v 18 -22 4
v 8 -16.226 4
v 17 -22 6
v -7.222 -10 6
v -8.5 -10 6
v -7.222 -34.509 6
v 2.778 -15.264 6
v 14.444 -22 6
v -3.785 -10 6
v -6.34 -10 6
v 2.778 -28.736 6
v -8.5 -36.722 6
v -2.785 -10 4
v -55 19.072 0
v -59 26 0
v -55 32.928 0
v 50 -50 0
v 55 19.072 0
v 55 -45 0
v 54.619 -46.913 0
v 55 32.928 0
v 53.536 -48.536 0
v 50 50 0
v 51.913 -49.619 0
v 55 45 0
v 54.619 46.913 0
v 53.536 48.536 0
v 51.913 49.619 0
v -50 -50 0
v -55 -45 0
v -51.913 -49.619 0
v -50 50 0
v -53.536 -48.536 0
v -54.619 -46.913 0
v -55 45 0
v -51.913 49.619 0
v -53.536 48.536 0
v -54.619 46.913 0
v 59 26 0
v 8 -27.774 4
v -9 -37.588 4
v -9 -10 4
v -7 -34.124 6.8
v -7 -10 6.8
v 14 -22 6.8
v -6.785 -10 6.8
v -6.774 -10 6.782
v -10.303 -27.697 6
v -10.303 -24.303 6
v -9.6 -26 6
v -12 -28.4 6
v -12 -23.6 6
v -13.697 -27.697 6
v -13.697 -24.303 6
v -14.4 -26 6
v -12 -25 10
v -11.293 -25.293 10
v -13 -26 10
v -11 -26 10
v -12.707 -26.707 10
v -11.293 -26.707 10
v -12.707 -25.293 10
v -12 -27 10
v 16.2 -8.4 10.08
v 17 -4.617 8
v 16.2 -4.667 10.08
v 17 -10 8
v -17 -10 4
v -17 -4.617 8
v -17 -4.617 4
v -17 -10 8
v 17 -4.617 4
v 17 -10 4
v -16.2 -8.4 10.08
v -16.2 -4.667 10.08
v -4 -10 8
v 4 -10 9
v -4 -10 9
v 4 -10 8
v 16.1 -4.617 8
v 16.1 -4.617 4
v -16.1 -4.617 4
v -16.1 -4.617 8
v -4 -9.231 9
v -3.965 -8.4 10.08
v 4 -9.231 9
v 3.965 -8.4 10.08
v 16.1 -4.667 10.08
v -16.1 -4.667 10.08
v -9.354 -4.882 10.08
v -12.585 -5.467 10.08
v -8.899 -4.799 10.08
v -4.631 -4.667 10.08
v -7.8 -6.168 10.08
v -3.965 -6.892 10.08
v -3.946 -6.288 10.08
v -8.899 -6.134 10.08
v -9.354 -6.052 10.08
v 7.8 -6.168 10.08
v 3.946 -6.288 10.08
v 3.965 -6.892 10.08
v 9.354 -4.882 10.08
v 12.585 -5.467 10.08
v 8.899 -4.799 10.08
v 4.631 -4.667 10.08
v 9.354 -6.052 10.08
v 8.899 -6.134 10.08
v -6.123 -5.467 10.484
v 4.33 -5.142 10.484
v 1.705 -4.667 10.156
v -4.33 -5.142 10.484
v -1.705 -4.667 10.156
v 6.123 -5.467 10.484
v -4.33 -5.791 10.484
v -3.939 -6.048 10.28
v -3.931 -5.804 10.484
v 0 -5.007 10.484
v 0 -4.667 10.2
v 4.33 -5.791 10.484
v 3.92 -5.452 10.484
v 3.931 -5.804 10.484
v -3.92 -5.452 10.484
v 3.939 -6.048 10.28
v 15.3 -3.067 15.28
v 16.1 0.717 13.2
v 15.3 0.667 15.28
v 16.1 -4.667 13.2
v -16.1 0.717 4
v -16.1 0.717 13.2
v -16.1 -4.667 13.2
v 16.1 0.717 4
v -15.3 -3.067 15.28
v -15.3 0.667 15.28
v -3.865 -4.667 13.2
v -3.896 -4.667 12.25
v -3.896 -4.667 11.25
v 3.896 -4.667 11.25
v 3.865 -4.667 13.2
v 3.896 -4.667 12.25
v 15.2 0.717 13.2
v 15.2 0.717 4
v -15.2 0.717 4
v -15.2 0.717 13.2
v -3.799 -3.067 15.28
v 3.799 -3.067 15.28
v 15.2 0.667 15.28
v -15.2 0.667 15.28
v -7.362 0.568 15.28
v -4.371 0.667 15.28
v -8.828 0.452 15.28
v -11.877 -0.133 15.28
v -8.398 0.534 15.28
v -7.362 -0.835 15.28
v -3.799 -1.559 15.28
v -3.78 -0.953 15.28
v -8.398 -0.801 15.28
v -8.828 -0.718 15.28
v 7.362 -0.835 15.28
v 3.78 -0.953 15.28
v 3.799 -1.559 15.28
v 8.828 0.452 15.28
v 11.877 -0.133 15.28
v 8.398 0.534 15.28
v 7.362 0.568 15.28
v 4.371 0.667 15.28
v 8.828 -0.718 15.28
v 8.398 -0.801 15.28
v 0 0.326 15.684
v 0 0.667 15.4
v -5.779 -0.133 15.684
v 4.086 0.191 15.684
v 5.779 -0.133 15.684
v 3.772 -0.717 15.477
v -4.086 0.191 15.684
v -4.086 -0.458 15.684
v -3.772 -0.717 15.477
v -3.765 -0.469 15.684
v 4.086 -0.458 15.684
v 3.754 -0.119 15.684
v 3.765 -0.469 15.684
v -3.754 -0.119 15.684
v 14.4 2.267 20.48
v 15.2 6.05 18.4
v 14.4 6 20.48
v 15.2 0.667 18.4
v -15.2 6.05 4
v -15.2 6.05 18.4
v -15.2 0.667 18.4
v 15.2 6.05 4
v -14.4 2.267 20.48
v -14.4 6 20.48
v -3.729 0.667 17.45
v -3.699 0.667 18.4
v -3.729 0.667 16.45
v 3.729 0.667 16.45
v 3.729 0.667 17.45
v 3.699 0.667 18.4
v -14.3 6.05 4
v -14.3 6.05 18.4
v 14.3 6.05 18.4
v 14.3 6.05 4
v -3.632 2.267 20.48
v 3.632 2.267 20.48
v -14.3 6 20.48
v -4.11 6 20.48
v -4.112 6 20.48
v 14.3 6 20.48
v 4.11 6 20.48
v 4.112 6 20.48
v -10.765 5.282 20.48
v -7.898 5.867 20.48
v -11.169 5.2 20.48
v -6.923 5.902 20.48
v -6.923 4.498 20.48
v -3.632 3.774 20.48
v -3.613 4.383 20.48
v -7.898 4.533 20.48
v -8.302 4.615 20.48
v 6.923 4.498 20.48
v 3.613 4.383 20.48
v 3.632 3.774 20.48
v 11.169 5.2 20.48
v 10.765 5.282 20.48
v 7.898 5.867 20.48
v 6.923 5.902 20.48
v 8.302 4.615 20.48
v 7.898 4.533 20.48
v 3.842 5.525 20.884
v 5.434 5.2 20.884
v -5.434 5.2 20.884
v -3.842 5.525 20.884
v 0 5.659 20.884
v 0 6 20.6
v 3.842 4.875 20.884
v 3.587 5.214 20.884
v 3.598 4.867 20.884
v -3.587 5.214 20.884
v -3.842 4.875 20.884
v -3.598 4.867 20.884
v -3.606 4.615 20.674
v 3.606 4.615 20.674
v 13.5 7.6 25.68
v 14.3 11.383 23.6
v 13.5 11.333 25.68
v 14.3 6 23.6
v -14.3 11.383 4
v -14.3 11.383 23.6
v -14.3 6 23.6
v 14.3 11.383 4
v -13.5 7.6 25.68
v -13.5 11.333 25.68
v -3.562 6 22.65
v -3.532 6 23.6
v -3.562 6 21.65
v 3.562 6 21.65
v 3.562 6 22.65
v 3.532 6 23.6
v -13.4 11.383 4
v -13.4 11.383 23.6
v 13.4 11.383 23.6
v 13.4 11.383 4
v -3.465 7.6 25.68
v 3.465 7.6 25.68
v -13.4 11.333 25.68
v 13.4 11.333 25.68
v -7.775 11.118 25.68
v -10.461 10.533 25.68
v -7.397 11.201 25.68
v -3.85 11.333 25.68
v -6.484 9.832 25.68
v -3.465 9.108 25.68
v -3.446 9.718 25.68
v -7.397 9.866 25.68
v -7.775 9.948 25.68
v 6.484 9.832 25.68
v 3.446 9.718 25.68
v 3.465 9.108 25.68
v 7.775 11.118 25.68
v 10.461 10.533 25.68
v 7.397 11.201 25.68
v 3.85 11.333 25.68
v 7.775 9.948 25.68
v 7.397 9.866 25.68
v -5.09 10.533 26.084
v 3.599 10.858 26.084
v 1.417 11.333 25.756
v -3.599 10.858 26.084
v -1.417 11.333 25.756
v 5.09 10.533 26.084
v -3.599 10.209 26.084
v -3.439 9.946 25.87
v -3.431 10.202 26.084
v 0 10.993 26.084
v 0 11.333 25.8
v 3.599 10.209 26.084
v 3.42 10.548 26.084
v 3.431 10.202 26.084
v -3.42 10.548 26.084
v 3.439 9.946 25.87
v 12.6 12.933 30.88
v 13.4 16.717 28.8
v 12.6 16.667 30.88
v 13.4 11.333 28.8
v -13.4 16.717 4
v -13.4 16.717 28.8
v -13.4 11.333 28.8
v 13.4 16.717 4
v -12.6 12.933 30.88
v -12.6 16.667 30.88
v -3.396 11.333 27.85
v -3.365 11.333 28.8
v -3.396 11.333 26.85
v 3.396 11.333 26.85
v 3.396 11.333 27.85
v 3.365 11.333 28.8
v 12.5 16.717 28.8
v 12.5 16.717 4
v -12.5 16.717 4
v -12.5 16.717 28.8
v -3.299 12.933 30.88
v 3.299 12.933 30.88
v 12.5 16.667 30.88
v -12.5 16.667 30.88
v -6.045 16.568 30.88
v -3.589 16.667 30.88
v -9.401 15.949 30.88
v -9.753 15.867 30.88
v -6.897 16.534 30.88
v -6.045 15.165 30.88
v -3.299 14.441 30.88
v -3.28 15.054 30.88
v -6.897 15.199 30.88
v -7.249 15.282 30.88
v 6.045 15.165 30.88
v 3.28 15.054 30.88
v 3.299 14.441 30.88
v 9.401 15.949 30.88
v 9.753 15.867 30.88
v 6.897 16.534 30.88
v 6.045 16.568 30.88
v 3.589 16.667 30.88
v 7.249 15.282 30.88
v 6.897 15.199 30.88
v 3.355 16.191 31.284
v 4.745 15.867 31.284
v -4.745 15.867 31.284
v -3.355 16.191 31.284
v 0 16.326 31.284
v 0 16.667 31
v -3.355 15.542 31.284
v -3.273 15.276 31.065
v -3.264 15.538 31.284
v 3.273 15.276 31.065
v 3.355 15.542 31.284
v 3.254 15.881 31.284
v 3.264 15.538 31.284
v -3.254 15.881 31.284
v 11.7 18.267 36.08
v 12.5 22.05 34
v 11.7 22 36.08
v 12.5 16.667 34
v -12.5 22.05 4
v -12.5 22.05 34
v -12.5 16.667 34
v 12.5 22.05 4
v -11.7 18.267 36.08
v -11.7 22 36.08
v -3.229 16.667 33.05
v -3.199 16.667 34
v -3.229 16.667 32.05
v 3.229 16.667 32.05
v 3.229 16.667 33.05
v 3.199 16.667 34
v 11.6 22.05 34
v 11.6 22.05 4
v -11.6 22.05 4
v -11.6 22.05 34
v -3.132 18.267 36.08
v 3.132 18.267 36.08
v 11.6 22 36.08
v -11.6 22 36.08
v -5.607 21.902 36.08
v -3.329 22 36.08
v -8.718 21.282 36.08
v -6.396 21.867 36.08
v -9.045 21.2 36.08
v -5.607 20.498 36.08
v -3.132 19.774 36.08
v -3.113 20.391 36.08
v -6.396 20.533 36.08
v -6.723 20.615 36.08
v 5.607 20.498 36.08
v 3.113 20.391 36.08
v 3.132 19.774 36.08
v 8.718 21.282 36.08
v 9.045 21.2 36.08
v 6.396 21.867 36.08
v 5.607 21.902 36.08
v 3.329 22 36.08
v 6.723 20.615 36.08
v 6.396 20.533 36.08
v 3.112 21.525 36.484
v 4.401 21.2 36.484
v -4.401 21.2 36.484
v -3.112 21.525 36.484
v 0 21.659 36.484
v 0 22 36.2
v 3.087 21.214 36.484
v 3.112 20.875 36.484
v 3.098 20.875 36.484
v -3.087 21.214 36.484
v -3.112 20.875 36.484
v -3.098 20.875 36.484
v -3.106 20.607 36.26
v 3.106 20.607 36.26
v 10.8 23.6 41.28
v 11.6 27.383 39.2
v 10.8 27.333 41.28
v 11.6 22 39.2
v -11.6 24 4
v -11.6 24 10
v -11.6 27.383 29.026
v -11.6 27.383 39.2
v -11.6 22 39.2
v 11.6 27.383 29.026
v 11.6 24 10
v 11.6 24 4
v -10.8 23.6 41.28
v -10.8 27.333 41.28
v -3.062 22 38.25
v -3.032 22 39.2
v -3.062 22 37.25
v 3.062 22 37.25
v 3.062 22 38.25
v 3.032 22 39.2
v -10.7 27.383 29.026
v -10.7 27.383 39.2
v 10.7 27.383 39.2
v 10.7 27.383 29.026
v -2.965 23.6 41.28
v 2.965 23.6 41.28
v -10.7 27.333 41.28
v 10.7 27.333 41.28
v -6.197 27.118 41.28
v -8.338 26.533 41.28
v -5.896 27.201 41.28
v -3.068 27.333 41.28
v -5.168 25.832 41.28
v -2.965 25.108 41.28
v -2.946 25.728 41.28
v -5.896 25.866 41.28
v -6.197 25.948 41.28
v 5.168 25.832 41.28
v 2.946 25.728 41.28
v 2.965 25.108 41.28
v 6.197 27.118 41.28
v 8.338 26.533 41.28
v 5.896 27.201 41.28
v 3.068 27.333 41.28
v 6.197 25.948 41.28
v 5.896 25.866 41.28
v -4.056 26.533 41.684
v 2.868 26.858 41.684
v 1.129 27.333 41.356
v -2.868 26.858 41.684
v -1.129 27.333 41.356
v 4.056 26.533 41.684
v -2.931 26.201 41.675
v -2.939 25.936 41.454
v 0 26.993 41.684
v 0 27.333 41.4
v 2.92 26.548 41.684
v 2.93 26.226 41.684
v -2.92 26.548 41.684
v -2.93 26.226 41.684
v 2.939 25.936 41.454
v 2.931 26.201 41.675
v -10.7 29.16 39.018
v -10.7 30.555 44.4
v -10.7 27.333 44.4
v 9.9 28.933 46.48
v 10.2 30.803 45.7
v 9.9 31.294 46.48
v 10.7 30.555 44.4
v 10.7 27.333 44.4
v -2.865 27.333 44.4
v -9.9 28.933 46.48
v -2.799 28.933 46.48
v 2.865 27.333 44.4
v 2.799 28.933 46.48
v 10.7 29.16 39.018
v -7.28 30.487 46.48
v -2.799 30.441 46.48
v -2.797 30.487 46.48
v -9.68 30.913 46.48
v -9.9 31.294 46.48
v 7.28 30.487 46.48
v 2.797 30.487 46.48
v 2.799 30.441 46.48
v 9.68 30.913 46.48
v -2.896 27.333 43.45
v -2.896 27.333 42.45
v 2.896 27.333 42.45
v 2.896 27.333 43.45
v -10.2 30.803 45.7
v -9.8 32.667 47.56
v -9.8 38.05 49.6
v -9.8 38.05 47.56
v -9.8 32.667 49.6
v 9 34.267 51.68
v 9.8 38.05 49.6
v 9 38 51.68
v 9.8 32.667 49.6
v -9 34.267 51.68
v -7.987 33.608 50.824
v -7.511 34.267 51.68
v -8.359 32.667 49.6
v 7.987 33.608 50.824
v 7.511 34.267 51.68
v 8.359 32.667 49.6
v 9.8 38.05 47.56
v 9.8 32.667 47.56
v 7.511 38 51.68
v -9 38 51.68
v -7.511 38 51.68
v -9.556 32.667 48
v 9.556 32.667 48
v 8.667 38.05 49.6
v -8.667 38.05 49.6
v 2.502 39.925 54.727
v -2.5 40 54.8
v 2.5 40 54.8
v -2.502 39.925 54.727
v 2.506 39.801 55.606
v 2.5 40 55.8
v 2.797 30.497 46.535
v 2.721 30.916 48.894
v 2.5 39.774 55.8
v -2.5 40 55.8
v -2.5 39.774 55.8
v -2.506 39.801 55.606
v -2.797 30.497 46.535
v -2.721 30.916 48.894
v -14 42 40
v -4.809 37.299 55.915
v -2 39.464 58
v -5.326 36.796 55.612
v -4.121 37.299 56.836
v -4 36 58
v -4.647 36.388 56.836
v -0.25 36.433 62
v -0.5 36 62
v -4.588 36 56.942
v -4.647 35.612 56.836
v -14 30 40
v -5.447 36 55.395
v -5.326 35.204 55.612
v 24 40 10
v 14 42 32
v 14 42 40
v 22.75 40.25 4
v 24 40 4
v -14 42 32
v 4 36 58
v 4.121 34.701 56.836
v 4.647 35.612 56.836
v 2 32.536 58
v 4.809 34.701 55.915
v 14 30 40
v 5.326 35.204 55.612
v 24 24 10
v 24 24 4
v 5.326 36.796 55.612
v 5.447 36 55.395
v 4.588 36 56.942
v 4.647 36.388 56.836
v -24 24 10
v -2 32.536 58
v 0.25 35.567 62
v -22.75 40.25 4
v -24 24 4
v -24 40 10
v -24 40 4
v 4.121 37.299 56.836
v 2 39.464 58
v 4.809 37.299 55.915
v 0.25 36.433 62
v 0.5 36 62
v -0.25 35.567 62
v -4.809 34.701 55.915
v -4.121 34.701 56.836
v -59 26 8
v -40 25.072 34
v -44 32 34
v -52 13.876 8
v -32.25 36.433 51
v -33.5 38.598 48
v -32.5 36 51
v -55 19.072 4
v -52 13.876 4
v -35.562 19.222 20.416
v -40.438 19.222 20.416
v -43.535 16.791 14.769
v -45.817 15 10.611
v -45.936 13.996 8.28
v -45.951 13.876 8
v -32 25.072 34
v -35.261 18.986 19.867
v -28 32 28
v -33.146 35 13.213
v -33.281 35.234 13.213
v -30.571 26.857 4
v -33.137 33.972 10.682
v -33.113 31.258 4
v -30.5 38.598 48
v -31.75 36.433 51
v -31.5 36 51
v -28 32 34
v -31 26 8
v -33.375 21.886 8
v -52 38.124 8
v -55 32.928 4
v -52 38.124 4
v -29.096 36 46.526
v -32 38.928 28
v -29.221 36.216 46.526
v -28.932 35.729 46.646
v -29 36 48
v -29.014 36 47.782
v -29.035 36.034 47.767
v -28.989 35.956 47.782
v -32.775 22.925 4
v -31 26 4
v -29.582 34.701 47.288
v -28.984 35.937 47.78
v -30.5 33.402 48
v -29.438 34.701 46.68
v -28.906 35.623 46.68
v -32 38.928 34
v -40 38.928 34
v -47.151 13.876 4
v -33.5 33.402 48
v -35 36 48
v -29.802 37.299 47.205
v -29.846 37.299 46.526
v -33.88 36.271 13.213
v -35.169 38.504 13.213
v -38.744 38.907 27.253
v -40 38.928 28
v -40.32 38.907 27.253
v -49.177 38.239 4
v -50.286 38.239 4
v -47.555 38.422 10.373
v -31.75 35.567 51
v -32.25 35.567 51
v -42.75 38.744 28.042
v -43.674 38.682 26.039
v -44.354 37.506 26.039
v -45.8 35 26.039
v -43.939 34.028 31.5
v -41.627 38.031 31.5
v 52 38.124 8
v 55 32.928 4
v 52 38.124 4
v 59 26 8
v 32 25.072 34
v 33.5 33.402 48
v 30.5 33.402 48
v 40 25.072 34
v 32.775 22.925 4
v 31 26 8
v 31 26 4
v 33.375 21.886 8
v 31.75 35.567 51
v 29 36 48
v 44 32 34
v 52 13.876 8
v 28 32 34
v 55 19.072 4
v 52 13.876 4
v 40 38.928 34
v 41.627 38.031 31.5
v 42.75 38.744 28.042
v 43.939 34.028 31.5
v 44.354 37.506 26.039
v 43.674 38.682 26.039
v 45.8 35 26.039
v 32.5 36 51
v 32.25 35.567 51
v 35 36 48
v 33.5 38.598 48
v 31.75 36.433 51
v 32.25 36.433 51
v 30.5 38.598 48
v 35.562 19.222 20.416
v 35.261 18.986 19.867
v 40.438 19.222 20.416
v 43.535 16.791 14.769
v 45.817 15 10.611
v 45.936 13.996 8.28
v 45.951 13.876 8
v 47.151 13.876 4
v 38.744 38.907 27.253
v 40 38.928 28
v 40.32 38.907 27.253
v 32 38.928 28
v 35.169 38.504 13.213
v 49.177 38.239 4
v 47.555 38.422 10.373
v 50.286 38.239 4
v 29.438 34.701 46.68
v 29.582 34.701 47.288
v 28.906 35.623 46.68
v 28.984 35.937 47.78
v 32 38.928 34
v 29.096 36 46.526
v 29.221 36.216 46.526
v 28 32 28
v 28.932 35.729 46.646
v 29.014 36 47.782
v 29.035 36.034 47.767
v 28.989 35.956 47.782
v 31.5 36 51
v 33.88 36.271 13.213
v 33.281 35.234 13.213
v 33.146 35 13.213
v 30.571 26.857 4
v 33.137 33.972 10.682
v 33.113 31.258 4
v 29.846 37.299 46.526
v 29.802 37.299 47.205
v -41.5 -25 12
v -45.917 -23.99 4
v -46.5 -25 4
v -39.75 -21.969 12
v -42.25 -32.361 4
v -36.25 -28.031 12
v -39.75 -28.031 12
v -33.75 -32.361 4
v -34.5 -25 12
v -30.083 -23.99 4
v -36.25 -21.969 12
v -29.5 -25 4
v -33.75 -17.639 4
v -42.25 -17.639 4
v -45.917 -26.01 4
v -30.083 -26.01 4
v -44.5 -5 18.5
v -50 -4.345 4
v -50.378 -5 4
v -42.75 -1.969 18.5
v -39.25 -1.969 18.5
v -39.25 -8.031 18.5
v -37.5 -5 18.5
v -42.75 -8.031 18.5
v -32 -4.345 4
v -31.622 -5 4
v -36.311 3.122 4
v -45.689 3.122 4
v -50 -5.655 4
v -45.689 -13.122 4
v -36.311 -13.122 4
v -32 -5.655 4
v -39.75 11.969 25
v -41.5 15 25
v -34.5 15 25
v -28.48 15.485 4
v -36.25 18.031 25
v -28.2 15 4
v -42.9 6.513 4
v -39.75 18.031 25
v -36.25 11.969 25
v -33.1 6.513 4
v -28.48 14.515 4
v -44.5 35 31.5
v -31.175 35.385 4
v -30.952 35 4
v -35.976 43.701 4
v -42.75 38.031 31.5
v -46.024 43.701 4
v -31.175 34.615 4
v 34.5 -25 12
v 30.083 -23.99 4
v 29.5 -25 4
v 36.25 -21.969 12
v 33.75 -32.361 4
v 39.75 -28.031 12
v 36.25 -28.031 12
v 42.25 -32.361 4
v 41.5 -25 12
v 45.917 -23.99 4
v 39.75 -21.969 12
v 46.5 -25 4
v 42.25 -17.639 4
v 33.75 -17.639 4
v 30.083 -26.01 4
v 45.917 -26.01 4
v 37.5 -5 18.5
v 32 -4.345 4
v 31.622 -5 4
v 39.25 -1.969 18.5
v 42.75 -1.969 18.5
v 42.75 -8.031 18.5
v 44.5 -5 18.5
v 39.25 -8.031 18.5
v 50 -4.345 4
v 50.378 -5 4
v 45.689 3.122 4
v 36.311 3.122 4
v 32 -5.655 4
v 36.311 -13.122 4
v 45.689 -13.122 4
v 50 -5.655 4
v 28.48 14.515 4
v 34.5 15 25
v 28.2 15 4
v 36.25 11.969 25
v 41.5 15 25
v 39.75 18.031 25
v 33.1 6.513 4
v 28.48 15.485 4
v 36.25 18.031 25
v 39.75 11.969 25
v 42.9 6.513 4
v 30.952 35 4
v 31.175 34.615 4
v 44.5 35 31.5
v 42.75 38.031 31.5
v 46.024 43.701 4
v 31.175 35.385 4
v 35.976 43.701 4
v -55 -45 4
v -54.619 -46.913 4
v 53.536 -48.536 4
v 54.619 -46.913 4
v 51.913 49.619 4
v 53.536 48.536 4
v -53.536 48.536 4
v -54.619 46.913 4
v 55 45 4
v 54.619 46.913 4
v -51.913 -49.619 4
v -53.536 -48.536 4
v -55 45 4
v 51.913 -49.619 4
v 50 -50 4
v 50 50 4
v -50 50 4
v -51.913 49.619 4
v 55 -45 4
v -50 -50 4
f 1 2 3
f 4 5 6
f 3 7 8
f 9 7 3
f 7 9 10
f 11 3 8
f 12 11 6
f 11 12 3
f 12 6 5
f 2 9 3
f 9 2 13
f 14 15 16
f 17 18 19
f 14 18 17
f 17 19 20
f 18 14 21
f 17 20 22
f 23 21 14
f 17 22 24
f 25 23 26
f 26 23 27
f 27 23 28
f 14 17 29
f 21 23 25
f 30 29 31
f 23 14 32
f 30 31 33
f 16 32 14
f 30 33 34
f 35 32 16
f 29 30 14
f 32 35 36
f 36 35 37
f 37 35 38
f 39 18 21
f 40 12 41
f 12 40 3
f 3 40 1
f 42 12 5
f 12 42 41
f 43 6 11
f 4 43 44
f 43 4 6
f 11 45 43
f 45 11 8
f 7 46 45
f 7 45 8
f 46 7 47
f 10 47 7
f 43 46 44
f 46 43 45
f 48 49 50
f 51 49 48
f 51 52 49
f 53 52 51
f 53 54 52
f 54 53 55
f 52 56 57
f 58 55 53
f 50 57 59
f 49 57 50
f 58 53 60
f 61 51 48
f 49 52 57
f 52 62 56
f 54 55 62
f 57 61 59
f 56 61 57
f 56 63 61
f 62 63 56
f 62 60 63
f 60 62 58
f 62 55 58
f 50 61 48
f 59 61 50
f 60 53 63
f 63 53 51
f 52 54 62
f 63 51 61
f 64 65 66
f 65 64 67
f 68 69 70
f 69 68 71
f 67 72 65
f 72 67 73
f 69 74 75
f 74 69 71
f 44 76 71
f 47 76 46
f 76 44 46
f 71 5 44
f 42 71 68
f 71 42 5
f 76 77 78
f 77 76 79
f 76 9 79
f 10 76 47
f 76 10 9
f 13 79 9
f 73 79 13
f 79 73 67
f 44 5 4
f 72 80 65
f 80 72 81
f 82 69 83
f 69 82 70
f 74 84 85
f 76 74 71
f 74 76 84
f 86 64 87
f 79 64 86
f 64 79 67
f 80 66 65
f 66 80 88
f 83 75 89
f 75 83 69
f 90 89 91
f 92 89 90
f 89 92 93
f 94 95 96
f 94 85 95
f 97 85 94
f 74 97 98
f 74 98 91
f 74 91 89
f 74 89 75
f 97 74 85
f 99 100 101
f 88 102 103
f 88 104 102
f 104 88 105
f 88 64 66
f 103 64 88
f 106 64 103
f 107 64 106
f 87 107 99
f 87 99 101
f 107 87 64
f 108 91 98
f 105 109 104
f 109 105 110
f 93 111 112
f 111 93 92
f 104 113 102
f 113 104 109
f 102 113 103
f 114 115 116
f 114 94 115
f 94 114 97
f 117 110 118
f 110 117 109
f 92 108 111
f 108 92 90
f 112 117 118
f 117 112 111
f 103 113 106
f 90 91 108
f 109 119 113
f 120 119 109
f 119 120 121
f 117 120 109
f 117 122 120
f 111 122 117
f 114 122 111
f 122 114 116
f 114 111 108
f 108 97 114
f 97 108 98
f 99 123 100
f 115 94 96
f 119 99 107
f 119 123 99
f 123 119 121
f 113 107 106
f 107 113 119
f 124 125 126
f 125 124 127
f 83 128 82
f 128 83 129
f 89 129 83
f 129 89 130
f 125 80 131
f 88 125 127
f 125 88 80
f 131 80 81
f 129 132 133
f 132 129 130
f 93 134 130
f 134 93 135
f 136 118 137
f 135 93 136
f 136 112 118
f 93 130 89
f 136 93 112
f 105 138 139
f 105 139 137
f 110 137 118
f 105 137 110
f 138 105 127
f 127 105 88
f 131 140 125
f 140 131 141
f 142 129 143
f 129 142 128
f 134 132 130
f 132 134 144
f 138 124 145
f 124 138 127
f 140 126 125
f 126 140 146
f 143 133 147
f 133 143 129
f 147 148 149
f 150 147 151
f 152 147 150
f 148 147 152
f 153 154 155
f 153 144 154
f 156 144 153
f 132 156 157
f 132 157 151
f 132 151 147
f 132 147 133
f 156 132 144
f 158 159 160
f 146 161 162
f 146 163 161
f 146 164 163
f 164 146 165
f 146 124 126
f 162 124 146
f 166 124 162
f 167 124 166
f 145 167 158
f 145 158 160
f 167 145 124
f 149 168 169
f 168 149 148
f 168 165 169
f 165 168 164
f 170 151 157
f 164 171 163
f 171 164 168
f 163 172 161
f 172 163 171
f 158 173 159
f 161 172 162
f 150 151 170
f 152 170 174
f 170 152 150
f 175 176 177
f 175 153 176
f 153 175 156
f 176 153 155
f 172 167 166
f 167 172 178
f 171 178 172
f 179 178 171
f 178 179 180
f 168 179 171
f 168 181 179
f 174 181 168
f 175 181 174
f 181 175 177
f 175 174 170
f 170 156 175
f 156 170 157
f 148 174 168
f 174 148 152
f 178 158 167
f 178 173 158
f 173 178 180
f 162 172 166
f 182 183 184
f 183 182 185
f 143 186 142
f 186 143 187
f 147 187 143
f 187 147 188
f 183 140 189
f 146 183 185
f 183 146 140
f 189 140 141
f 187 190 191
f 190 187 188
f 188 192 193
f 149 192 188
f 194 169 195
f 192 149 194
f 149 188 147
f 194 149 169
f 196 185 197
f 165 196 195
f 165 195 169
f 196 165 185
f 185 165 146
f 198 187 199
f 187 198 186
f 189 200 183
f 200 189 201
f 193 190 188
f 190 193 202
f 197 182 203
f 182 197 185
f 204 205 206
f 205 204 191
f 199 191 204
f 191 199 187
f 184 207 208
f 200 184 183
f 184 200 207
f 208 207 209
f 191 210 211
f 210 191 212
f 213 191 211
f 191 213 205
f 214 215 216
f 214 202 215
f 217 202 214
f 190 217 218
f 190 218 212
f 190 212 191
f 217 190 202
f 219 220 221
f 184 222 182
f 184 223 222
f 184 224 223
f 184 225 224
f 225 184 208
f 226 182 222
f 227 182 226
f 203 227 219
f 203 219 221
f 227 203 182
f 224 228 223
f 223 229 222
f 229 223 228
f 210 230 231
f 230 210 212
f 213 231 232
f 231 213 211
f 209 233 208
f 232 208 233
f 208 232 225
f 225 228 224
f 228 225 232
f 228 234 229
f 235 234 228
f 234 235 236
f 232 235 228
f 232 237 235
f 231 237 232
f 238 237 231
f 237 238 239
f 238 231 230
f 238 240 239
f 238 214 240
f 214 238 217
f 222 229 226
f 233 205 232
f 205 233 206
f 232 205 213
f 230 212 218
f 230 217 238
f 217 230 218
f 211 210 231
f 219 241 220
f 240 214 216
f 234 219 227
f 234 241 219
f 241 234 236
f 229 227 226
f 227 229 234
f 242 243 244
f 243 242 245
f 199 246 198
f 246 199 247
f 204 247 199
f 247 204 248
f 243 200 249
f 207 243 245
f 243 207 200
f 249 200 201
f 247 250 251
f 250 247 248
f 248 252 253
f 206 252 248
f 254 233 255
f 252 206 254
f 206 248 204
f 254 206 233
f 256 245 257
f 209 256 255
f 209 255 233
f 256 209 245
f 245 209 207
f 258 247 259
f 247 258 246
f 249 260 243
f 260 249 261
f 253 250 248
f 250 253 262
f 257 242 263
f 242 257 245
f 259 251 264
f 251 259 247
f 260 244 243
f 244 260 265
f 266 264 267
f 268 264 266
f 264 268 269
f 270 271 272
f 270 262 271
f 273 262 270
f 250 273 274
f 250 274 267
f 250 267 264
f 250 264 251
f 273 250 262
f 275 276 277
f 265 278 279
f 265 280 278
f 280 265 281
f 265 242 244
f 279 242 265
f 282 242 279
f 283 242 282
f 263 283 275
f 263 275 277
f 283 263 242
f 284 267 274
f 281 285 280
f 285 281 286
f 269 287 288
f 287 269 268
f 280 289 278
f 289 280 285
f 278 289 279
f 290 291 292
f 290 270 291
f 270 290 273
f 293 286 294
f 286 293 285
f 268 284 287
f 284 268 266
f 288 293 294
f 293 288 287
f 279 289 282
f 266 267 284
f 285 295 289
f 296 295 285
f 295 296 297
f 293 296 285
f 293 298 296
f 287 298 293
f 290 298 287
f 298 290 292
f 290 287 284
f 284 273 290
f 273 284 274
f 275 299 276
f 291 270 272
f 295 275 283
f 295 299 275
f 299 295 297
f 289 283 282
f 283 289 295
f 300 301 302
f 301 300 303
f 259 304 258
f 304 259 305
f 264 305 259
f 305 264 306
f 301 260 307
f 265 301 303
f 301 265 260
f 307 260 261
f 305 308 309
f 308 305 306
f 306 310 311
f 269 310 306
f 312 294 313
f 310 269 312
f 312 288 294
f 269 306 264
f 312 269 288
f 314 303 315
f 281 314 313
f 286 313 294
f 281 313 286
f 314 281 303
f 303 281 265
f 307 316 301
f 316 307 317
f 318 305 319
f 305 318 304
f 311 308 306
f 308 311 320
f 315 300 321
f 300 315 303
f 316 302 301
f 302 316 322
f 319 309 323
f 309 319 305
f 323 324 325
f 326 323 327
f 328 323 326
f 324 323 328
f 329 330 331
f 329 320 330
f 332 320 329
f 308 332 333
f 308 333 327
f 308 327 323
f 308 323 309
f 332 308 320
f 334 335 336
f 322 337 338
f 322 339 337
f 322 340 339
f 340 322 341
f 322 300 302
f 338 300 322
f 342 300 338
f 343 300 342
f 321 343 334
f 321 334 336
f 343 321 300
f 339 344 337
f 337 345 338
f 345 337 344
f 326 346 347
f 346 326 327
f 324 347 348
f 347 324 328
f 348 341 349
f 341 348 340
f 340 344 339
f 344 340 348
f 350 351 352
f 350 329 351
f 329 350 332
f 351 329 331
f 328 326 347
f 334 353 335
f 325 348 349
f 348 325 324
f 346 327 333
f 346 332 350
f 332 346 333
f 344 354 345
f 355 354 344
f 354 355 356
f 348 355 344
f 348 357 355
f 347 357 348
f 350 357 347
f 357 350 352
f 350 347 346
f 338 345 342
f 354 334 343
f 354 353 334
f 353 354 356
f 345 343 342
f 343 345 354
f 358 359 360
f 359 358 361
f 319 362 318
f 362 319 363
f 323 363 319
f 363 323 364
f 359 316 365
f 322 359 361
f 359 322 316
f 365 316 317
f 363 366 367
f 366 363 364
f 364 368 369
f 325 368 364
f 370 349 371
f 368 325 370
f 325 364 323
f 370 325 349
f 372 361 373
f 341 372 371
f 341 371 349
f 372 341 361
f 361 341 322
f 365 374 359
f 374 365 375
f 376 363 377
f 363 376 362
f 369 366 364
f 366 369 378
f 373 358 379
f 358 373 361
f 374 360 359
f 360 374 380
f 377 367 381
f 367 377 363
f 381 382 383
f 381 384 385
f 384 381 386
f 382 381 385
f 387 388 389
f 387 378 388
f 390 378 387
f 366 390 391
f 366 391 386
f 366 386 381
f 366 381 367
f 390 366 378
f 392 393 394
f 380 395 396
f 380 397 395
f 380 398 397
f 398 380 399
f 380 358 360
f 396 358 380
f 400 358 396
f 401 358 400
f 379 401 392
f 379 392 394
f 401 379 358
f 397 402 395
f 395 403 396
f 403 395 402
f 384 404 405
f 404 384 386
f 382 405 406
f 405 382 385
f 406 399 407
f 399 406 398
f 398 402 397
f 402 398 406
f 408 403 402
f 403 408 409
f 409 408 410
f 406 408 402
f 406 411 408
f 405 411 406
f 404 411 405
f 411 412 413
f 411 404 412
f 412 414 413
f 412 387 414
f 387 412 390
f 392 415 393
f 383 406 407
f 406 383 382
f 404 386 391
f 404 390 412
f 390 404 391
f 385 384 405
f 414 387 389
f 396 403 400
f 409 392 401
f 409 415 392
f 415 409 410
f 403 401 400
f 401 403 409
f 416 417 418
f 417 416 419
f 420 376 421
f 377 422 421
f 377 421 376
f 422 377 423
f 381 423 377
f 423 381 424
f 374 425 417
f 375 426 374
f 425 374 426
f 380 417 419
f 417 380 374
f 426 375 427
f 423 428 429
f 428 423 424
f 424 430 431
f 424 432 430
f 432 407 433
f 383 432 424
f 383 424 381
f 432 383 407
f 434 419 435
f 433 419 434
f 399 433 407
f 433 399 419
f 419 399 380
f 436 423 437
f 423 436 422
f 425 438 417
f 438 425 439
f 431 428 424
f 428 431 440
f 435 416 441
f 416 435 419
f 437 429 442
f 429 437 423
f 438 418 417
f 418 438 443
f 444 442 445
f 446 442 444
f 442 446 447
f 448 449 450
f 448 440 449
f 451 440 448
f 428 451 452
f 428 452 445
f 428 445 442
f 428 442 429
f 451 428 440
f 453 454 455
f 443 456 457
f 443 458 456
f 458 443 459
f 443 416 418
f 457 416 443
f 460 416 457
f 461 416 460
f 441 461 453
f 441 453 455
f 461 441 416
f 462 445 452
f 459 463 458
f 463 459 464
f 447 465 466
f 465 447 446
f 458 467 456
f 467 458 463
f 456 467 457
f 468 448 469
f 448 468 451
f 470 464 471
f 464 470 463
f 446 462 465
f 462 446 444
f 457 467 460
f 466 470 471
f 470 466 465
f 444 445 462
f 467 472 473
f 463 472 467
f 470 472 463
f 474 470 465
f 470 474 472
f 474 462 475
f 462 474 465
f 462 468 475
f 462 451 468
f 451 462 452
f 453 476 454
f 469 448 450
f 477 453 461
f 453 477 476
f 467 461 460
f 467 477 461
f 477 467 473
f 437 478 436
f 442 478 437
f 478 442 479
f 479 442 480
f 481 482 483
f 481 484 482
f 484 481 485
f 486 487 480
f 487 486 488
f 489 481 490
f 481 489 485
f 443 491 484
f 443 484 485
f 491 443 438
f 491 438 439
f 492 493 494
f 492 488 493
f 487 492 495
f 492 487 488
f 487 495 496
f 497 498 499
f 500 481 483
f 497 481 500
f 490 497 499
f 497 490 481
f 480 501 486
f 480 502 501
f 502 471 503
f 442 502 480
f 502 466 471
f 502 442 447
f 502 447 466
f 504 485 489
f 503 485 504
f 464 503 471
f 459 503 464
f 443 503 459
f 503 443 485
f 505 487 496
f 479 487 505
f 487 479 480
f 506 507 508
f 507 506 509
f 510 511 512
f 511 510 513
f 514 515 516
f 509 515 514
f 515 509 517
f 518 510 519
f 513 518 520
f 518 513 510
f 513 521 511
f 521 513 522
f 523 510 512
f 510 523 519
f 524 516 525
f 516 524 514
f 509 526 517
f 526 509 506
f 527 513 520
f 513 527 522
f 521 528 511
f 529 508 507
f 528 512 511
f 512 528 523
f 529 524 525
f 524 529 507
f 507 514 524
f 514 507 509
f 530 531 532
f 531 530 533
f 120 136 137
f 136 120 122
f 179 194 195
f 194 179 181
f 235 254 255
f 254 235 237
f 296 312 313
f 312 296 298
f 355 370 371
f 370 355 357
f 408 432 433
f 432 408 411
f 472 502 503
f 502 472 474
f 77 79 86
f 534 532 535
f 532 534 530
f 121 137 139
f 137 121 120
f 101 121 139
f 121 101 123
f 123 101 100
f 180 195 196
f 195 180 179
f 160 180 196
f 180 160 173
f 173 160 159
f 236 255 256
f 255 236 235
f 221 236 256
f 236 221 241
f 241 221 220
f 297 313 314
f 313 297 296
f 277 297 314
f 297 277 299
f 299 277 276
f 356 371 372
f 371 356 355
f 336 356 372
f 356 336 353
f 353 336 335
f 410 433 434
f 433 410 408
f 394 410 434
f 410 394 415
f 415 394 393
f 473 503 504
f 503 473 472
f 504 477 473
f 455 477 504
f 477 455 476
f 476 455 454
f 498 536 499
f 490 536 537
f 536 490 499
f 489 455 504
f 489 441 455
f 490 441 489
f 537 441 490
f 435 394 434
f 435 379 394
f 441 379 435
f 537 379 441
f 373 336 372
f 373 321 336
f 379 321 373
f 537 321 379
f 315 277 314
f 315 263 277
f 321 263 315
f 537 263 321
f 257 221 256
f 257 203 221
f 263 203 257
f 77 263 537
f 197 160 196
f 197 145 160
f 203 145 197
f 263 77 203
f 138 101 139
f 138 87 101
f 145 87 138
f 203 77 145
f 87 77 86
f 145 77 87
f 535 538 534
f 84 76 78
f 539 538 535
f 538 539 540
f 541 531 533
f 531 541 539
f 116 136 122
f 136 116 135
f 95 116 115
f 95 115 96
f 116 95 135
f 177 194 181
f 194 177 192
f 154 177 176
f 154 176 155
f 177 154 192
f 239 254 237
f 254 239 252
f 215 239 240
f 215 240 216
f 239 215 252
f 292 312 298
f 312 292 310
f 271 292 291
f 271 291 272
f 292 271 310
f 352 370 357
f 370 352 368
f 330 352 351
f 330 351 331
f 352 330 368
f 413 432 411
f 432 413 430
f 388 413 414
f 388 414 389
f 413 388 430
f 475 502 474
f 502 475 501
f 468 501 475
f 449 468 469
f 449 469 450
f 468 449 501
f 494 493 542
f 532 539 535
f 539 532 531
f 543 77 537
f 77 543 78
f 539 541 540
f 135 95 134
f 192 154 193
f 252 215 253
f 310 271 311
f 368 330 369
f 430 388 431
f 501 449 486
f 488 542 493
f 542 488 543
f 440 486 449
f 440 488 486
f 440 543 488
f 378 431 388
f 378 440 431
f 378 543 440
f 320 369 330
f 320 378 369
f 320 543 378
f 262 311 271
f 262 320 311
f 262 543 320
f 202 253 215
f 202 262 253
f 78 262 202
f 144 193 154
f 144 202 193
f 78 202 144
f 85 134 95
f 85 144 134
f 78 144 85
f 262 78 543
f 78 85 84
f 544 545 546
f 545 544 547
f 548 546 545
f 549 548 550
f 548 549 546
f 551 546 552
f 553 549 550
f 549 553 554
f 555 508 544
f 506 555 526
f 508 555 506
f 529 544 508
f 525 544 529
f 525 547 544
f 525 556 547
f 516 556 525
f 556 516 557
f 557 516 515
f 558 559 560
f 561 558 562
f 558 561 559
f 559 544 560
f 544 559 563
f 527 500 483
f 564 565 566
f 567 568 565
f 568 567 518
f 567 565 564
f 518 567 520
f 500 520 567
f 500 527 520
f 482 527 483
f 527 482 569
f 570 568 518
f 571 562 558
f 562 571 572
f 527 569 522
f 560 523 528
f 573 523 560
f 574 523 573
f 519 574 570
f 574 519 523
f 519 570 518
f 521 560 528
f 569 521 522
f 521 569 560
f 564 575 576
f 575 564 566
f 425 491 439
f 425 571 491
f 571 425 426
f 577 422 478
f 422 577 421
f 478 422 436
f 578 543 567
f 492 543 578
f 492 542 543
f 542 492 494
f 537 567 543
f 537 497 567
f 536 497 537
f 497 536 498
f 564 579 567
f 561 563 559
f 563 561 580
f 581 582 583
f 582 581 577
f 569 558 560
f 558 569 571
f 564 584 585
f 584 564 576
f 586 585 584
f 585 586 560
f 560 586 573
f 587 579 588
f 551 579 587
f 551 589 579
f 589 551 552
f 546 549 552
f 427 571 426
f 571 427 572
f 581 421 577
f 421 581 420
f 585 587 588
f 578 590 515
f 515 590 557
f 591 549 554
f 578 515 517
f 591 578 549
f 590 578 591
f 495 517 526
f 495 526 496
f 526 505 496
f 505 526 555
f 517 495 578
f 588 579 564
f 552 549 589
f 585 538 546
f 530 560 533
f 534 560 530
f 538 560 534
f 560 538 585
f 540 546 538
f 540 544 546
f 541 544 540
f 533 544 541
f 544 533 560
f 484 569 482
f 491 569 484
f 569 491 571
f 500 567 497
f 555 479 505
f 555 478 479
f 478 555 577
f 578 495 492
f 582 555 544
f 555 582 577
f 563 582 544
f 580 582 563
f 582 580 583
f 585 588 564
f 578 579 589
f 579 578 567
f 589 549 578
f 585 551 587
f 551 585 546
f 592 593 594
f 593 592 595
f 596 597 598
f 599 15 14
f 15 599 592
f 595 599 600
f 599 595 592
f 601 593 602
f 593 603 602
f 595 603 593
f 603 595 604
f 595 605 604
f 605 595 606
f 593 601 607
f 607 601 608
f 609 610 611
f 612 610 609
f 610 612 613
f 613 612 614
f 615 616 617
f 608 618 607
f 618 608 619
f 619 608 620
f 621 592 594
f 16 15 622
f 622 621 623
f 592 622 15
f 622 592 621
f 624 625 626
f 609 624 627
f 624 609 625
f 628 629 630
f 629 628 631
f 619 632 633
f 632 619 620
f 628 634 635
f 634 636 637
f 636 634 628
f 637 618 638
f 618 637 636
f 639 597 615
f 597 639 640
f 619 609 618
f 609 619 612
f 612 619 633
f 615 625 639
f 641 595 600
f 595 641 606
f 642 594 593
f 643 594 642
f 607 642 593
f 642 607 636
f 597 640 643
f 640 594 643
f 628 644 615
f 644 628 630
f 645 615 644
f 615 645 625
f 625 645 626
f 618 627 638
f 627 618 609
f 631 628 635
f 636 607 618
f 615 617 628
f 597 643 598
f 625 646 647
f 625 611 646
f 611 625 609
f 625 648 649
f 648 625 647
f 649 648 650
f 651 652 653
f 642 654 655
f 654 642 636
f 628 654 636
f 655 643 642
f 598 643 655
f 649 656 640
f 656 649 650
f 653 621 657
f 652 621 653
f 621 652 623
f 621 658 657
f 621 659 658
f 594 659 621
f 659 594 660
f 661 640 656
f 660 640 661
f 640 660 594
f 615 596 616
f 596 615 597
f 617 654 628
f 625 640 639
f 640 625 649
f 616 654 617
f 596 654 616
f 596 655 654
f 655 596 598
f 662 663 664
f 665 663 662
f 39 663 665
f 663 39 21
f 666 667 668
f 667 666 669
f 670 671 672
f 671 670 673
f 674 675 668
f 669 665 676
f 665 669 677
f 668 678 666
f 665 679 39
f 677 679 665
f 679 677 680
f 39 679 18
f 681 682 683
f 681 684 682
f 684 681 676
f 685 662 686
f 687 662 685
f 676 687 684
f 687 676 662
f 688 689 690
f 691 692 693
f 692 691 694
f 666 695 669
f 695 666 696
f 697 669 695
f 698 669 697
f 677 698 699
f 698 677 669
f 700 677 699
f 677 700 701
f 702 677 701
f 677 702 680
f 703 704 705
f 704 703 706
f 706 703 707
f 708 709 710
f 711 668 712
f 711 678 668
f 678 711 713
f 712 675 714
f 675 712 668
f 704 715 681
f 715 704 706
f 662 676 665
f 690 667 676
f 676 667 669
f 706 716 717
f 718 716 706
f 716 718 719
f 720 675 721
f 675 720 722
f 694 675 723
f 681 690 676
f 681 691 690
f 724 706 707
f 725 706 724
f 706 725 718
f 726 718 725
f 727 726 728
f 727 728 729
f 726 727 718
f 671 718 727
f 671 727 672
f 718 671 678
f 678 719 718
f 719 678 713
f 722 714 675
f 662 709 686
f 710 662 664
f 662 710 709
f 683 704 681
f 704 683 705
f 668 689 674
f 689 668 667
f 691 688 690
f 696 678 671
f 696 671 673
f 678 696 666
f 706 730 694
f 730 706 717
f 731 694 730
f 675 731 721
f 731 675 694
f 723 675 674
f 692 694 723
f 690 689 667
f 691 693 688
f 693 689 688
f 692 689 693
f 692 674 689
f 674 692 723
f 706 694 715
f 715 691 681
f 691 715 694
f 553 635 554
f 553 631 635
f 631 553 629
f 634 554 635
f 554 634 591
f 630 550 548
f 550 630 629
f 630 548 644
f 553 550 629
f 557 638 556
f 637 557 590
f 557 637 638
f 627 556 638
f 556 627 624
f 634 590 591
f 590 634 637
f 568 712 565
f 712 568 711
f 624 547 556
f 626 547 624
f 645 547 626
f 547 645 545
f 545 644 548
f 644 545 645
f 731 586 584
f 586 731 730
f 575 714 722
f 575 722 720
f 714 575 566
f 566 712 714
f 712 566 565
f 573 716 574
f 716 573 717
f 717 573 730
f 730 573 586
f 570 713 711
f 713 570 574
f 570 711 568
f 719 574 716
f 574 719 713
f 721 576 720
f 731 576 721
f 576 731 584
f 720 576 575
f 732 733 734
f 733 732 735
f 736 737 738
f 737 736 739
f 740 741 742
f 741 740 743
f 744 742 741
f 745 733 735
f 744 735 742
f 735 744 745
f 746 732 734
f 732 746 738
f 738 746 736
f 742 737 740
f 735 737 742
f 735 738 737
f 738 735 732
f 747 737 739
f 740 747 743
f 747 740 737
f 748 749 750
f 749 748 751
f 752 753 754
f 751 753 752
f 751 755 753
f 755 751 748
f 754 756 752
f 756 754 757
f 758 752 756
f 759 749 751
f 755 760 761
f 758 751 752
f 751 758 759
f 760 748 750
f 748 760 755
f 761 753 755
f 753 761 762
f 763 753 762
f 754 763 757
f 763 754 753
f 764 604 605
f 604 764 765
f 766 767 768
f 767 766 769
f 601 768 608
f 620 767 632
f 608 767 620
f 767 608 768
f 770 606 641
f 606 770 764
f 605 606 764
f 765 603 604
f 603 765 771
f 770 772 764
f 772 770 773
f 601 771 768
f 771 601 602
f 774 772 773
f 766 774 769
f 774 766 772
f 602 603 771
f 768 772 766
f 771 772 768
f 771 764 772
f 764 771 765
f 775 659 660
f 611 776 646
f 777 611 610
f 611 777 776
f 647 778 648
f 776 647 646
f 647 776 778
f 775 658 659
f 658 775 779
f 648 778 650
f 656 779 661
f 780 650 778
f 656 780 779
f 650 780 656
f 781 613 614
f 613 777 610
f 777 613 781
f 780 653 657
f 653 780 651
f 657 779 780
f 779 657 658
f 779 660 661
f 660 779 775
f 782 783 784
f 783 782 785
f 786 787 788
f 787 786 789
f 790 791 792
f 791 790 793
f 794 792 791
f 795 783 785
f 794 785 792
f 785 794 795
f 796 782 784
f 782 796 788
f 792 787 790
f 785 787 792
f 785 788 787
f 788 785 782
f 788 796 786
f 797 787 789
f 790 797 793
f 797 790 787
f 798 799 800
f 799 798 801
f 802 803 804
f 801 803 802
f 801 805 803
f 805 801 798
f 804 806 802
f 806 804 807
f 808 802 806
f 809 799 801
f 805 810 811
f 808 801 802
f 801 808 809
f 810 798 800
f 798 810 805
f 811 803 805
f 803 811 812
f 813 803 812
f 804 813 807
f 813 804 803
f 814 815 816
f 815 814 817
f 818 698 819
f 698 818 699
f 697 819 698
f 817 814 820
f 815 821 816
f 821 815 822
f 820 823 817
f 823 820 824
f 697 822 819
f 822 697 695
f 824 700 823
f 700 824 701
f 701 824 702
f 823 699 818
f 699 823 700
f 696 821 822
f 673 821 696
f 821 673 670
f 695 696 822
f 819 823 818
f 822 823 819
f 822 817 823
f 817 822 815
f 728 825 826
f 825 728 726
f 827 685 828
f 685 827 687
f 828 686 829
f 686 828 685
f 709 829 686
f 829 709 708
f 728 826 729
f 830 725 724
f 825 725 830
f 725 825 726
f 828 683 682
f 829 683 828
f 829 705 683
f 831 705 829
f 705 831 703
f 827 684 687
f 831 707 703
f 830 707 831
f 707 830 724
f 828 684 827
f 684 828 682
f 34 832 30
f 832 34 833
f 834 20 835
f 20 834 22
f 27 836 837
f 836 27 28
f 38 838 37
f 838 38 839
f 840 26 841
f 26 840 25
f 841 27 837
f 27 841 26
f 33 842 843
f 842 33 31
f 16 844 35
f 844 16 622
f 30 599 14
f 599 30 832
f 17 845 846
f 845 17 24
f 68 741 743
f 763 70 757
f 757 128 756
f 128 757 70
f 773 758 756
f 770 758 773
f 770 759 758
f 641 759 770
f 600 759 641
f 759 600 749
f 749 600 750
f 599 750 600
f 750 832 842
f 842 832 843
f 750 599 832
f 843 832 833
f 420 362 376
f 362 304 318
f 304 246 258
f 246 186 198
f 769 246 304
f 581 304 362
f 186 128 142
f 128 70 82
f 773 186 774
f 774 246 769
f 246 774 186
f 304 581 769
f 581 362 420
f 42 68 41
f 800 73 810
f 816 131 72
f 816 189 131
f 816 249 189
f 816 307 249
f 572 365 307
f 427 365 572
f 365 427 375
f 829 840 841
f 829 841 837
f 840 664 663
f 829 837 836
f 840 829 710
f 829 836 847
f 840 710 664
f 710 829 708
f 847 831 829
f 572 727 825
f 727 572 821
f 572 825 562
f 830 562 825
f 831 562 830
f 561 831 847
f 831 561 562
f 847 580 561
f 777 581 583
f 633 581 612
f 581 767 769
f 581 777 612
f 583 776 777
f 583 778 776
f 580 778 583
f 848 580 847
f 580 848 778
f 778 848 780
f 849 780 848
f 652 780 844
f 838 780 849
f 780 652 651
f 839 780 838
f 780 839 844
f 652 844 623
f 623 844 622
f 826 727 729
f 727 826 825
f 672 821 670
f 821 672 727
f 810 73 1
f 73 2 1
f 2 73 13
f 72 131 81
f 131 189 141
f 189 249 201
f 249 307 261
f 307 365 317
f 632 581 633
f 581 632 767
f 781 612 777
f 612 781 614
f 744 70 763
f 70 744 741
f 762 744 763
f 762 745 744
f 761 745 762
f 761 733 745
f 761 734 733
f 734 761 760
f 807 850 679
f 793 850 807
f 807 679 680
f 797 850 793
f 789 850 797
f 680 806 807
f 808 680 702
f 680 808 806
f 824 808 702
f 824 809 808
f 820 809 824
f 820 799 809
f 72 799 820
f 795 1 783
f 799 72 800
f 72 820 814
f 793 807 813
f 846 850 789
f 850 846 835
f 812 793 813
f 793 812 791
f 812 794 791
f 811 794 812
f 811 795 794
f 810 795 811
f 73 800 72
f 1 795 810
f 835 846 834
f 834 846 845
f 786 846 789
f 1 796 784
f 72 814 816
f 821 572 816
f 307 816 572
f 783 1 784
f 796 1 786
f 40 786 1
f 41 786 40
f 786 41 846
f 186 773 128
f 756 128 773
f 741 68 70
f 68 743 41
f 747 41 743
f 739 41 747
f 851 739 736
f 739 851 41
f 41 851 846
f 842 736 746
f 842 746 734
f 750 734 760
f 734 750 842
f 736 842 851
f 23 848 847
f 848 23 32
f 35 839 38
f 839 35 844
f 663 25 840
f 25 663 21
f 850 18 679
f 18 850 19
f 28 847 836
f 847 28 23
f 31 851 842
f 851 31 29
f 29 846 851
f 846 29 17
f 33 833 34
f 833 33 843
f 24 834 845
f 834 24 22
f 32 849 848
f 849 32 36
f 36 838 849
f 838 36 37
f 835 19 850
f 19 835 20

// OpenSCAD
// ====================================================================
// SWARG KI SEEDHI: THE STAIRWAY TO HEAVEN GLACIAL MASSIF
// Location: Swargarohini Massif & Satopanth Glacier, Garhwal Himalayas
// Authentic Geological & Mythic Features:
//   1. Sheer towering Swargarohini Peak Massif
//   2. "Swarg Ki Seedhi": The colossal natural tiered glacial ice steps
//      ascending up the mountain face into the heavens
//   3. Sacred Triangular Glacial Lake (Satopanth Tal) at foot of the steps
//   4. Glacial Moraines, lateral ridges, and Chaukhamba/Swargarohini crags
// Additive Manufacturing: 100% Manifold Solid, Supportless FDM (<=45° Overhangs)
// ====================================================================

$fn = 32;
eps = 0.05;

// Main Dimensions
massif_w = 110.0; // Width (X)
massif_d = 100.0; // Depth (Y)
base_h = 4.0;     // Plinth base thickness

swargarohini_glacial_massif();

module swargarohini_glacial_massif() {
    union() {
        // --- 1. PLINTH FOUNDATION (Z=0 Grounding) ---
        massif_base_plinth();

        // --- 2. SACRED TRIANGULAR SATOPANTH TAL (GLACIAL LAKE) ---
        satopanth_tal_basin();

        // --- 3. SWARG KI SEEDHI (TIERED GLACIAL STAIRWAY) ---
        swarg_ki_seedhi_ice_steps();

        // --- 4. TOWERING SWARGAROHINI PEAKS & MASSIVE RIDGES ---
        swargarohini_peaks();

        // --- 5. LATERAL MORAINE SCREE WALLS ---
        lateral_moraines();
    }
}

// 1. Plinth Foundation (Anti-warp corners)
module massif_base_plinth() {
    hull() {
        for (dx = [-massif_w/2 + 5, massif_w/2 - 5]) {
            for (dy = [-massif_d/2 + 5, massif_d/2 - 5]) {
                translate([dx, dy, 0])
                    cylinder(r = 5, h = base_h, $fn = 16);
            }
        }
    }
}

// 2. Sacred Triangular Satopanth Tal Basin (Where Trimurti bathe)
module satopanth_tal_basin() {
    lake_center_y = -massif_d/2 + 28.0;
    lake_side = 32.0;

    translate([0, lake_center_y, 0]) {
        // Elevated lake shore terrace
        hull() {
            cylinder(r1 = 20.0, r2 = 17.0, h = 6.0, $fn = 3); // Pure triangle
        }
        // Mirror-smooth water surface
        translate([0, 0, 5.0]) {
            cylinder(r1 = 15.0, r2 = 14.0, h = 1.8, $fn = 3);
        }
        // Shoreline holy prayer cairn
        translate([-12.0, -4.0, 6.0]) {
            cylinder(r1 = 2.4, r2 = 1.0, h = 4.0, $fn = 8);
        }
    }
}

// 3. Swarg Ki Seedhi: The Legendary Glacial Ice Steps
// Distinct, cascading horizontal shelf-like terraces ascending the central face
module swarg_ki_seedhi_ice_steps() {
    num_tiers = 9;
    stair_w = 34.0;
    y_start = -10.0;
    y_end = massif_d/2 - 12.0;
    step_depth = (y_end - y_start) / num_tiers;
    z_start = 8.0;
    z_rise = 5.2;

    union() {
        // Cascading Giant Glacial Ice Shelves
        for (i = [0 : num_tiers - 1]) {
            cur_y = y_start + i * step_depth;
            cur_z = z_start + i * z_rise;
            cur_w = stair_w - i * 1.8; // Gracefully tapers toward summit

            // Horizontal step tread with 45° supportless serac face
            hull() {
                translate([-cur_w/2, cur_y, 0])
                    cube([cur_w, step_depth + eps, cur_z]);
                translate([-cur_w/2 + 0.8, cur_y + step_depth * 0.3, 0])
                    cube([cur_w - 1.6, step_depth * 0.7, cur_z + z_rise * 0.4]);
            }

            // Serac ice lip on each step ledge
            translate([0, cur_y + step_depth * 0.85, cur_z + z_rise * 0.3])
                scale([cur_w/2 - 1.0, 1.2, 1.0])
                    sphere(r = 1.0, $fn = 8);
        }

        // Central Celestial Ascent Spine (Ascends straight to Swarga)
        hull() {
            translate([-4.0, y_start, z_start]) cube([8.0, 2.0, 1.0]);
            translate([-2.5, y_end, z_start + num_tiers * z_rise]) cube([5.0, 2.0, 1.0]);
        }
    }
}

// 4. Towering Swargarohini Massif Peaks (Swargarohini I, II, III)
module swargarohini_peaks() {
    summit_y = massif_d/2 - 14.0;
    summit_z = 58.0; // Towering pinnacle

    union() {
        // Main Swargarohini I Summit (Central Pyramid Peak)
        hull() {
            translate([-24.0, summit_y - 12.0, 0]) cube([48.0, 16.0, 10.0]);
            translate([-14.0, summit_y - 6.0, 32.0]) cube([28.0, 12.0, 8.0]);
            translate([0, summit_y, summit_z]) cylinder(r1 = 4.0, r2 = 0.5, h = 4.0, $fn = 6);
        }

        // Swargarohini II Peak (Left Flank)
        hull() {
            translate([-massif_w/2 + 10, summit_y - 10, 0]) cylinder(r = 14, h = 8, $fn = 6);
            translate([-36.0, summit_y - 4, 28.0]) cylinder(r = 8, h = 6, $fn = 6);
            translate([-32.0, summit_y, 48.0]) cylinder(r1 = 3.0, r2 = 0.5, h = 3.0, $fn = 6);
        }

        // Swargarohini III Peak (Right Flank)
        hull() {
            translate([massif_w/2 - 10, summit_y - 10, 0]) cylinder(r = 14, h = 8, $fn = 6);
            translate([36.0, summit_y - 4, 28.0]) cylinder(r = 8, h = 6, $fn = 6);
            translate([32.0, summit_y, 48.0]) cylinder(r1 = 3.0, r2 = 0.5, h = 3.0, $fn = 6);
        }

        // Connecting knife-edge arête ridges (Supportless 45° pyramidal walls)
        hull() {
            translate([-32.0, summit_y, 46.0]) cylinder(r = 1.5, h = 0.1, $fn = 6);
            translate([0, summit_y, summit_z]) cylinder(r = 1.5, h = 0.1, $fn = 6);
        }
        hull() {
            translate([32.0, summit_y, 46.0]) cylinder(r = 1.5, h = 0.1, $fn = 6);
            translate([0, summit_y, summit_z]) cylinder(r = 1.5, h = 0.1, $fn = 6);
        }
    }
}

// 5. Lateral Glacial Moraines (Framing both sides of the stairway)
module lateral_moraines() {
    union() {
        // Left Lateral Moraine Ridge
        for (i = [0 : 3]) {
            y_pos = -25.0 + i * 20.0;
            x_pos = -38.0 - (i % 2) * 3.0;
            h_pos = 12.0 + i * 6.5;
            translate([x_pos, y_pos, 0])
                cylinder(r1 = 11.0, r2 = 3.5, h = h_pos, $fn = 6);
        }

        // Right Lateral Moraine Ridge
        for (i = [0 : 3]) {
            y_pos = -25.0 + i * 20.0;
            x_pos = 38.0 + (i % 2) * 3.0;
            h_pos = 12.0 + i * 6.5;
            translate([x_pos, y_pos, 0])
                cylinder(r1 = 11.0, r2 = 3.5, h = h_pos, $fn = 6);
        }
    }
}
